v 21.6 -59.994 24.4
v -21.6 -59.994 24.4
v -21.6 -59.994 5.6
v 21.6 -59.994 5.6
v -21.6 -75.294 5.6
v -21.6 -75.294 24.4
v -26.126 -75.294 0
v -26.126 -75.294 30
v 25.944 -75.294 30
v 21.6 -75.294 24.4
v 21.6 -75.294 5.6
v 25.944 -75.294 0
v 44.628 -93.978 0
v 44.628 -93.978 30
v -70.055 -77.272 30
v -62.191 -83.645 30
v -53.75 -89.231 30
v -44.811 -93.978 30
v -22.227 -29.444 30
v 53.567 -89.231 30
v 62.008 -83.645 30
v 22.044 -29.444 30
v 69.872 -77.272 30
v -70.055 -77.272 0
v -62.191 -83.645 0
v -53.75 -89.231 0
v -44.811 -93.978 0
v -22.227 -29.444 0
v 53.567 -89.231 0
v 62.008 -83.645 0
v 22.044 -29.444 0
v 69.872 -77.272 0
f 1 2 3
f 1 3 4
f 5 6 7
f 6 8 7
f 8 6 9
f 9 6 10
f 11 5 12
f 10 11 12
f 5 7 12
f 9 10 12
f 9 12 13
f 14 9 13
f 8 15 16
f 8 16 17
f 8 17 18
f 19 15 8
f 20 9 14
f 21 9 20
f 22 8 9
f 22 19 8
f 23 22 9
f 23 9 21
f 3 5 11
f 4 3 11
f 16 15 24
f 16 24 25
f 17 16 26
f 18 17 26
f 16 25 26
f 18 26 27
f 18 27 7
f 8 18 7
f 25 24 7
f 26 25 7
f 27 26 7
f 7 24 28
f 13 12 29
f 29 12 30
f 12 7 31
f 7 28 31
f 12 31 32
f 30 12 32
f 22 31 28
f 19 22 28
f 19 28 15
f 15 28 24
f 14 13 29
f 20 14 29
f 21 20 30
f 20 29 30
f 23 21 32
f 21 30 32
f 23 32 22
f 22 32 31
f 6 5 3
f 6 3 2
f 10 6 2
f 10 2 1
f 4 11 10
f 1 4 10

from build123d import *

# Parameters (mm, degrees)
F1_DEPTH = 30
F2_W     = 43.2
F2_H     = 18.8
F3_DEPTH = 15.3


with BuildPart() as f1:
    # F0 (on Top) → F1 (new body)
    with BuildSketch(Plane.XY):
        with BuildLine():
            Line((22.0444222056, -29.4440398328), (-0.0914469621, -29.4440398328))
            Line((-0.0914469621, -29.4440398328), (-0.0914469621, -49.2588512566))
            Line((-0.0914469621, -49.2588512566), (25.9435530379, -75.2938512566))
            Line((25.9435530379, -75.2938512566), (44.6278690687, -93.9781672875))
            ThreePointArc((44.6278690687, -93.9781672875), (57.8553211437, -86.5395948889), (69.8723409305, -77.2719585577))
            Line((69.8723409305, -77.2719585577), (22.0444222056, -29.4440398328))
        make_face()
        with BuildLine():
            Line((-22.2273161299, -29.4440398328), (-70.0552348548, -77.2719585577))
            ThreePointArc((-70.0552348548, -77.2719585577), (-58.038215068, -86.5395948889), (-44.810762993, -93.9781672875))
            Line((-44.810762993, -93.9781672875), (-26.1264469621, -75.2938512566))
            Line((-26.1264469621, -75.2938512566), (-0.0914469621, -49.2588512566))
            Line((-0.0914469621, -49.2588512566), (-0.0914469621, -29.4440398328))
            Line((-0.0914469621, -29.4440398328), (-22.2273161299, -29.4440398328))
        make_face()
        Polygon((-0.0914469621, -49.2588512566), (-26.1264469621, -75.2938512566), (-0.0914469621, -75.2938512566), align=None)
        Polygon((-0.0914469621, -49.2588512566), (-0.0914469621, -75.2938512566), (25.9435530379, -75.2938512566), align=None)
    extrude(amount=F1_DEPTH)

    # F2 (on face) → F3 (cut)
    with BuildSketch(Plane.XZ.offset(75.2938512566)):
        with Locations((0, 14.9999954)):
            Rectangle(F2_W, F2_H)
    extrude(amount=-F3_DEPTH, mode=Mode.SUBTRACT)


solid = f1.part
